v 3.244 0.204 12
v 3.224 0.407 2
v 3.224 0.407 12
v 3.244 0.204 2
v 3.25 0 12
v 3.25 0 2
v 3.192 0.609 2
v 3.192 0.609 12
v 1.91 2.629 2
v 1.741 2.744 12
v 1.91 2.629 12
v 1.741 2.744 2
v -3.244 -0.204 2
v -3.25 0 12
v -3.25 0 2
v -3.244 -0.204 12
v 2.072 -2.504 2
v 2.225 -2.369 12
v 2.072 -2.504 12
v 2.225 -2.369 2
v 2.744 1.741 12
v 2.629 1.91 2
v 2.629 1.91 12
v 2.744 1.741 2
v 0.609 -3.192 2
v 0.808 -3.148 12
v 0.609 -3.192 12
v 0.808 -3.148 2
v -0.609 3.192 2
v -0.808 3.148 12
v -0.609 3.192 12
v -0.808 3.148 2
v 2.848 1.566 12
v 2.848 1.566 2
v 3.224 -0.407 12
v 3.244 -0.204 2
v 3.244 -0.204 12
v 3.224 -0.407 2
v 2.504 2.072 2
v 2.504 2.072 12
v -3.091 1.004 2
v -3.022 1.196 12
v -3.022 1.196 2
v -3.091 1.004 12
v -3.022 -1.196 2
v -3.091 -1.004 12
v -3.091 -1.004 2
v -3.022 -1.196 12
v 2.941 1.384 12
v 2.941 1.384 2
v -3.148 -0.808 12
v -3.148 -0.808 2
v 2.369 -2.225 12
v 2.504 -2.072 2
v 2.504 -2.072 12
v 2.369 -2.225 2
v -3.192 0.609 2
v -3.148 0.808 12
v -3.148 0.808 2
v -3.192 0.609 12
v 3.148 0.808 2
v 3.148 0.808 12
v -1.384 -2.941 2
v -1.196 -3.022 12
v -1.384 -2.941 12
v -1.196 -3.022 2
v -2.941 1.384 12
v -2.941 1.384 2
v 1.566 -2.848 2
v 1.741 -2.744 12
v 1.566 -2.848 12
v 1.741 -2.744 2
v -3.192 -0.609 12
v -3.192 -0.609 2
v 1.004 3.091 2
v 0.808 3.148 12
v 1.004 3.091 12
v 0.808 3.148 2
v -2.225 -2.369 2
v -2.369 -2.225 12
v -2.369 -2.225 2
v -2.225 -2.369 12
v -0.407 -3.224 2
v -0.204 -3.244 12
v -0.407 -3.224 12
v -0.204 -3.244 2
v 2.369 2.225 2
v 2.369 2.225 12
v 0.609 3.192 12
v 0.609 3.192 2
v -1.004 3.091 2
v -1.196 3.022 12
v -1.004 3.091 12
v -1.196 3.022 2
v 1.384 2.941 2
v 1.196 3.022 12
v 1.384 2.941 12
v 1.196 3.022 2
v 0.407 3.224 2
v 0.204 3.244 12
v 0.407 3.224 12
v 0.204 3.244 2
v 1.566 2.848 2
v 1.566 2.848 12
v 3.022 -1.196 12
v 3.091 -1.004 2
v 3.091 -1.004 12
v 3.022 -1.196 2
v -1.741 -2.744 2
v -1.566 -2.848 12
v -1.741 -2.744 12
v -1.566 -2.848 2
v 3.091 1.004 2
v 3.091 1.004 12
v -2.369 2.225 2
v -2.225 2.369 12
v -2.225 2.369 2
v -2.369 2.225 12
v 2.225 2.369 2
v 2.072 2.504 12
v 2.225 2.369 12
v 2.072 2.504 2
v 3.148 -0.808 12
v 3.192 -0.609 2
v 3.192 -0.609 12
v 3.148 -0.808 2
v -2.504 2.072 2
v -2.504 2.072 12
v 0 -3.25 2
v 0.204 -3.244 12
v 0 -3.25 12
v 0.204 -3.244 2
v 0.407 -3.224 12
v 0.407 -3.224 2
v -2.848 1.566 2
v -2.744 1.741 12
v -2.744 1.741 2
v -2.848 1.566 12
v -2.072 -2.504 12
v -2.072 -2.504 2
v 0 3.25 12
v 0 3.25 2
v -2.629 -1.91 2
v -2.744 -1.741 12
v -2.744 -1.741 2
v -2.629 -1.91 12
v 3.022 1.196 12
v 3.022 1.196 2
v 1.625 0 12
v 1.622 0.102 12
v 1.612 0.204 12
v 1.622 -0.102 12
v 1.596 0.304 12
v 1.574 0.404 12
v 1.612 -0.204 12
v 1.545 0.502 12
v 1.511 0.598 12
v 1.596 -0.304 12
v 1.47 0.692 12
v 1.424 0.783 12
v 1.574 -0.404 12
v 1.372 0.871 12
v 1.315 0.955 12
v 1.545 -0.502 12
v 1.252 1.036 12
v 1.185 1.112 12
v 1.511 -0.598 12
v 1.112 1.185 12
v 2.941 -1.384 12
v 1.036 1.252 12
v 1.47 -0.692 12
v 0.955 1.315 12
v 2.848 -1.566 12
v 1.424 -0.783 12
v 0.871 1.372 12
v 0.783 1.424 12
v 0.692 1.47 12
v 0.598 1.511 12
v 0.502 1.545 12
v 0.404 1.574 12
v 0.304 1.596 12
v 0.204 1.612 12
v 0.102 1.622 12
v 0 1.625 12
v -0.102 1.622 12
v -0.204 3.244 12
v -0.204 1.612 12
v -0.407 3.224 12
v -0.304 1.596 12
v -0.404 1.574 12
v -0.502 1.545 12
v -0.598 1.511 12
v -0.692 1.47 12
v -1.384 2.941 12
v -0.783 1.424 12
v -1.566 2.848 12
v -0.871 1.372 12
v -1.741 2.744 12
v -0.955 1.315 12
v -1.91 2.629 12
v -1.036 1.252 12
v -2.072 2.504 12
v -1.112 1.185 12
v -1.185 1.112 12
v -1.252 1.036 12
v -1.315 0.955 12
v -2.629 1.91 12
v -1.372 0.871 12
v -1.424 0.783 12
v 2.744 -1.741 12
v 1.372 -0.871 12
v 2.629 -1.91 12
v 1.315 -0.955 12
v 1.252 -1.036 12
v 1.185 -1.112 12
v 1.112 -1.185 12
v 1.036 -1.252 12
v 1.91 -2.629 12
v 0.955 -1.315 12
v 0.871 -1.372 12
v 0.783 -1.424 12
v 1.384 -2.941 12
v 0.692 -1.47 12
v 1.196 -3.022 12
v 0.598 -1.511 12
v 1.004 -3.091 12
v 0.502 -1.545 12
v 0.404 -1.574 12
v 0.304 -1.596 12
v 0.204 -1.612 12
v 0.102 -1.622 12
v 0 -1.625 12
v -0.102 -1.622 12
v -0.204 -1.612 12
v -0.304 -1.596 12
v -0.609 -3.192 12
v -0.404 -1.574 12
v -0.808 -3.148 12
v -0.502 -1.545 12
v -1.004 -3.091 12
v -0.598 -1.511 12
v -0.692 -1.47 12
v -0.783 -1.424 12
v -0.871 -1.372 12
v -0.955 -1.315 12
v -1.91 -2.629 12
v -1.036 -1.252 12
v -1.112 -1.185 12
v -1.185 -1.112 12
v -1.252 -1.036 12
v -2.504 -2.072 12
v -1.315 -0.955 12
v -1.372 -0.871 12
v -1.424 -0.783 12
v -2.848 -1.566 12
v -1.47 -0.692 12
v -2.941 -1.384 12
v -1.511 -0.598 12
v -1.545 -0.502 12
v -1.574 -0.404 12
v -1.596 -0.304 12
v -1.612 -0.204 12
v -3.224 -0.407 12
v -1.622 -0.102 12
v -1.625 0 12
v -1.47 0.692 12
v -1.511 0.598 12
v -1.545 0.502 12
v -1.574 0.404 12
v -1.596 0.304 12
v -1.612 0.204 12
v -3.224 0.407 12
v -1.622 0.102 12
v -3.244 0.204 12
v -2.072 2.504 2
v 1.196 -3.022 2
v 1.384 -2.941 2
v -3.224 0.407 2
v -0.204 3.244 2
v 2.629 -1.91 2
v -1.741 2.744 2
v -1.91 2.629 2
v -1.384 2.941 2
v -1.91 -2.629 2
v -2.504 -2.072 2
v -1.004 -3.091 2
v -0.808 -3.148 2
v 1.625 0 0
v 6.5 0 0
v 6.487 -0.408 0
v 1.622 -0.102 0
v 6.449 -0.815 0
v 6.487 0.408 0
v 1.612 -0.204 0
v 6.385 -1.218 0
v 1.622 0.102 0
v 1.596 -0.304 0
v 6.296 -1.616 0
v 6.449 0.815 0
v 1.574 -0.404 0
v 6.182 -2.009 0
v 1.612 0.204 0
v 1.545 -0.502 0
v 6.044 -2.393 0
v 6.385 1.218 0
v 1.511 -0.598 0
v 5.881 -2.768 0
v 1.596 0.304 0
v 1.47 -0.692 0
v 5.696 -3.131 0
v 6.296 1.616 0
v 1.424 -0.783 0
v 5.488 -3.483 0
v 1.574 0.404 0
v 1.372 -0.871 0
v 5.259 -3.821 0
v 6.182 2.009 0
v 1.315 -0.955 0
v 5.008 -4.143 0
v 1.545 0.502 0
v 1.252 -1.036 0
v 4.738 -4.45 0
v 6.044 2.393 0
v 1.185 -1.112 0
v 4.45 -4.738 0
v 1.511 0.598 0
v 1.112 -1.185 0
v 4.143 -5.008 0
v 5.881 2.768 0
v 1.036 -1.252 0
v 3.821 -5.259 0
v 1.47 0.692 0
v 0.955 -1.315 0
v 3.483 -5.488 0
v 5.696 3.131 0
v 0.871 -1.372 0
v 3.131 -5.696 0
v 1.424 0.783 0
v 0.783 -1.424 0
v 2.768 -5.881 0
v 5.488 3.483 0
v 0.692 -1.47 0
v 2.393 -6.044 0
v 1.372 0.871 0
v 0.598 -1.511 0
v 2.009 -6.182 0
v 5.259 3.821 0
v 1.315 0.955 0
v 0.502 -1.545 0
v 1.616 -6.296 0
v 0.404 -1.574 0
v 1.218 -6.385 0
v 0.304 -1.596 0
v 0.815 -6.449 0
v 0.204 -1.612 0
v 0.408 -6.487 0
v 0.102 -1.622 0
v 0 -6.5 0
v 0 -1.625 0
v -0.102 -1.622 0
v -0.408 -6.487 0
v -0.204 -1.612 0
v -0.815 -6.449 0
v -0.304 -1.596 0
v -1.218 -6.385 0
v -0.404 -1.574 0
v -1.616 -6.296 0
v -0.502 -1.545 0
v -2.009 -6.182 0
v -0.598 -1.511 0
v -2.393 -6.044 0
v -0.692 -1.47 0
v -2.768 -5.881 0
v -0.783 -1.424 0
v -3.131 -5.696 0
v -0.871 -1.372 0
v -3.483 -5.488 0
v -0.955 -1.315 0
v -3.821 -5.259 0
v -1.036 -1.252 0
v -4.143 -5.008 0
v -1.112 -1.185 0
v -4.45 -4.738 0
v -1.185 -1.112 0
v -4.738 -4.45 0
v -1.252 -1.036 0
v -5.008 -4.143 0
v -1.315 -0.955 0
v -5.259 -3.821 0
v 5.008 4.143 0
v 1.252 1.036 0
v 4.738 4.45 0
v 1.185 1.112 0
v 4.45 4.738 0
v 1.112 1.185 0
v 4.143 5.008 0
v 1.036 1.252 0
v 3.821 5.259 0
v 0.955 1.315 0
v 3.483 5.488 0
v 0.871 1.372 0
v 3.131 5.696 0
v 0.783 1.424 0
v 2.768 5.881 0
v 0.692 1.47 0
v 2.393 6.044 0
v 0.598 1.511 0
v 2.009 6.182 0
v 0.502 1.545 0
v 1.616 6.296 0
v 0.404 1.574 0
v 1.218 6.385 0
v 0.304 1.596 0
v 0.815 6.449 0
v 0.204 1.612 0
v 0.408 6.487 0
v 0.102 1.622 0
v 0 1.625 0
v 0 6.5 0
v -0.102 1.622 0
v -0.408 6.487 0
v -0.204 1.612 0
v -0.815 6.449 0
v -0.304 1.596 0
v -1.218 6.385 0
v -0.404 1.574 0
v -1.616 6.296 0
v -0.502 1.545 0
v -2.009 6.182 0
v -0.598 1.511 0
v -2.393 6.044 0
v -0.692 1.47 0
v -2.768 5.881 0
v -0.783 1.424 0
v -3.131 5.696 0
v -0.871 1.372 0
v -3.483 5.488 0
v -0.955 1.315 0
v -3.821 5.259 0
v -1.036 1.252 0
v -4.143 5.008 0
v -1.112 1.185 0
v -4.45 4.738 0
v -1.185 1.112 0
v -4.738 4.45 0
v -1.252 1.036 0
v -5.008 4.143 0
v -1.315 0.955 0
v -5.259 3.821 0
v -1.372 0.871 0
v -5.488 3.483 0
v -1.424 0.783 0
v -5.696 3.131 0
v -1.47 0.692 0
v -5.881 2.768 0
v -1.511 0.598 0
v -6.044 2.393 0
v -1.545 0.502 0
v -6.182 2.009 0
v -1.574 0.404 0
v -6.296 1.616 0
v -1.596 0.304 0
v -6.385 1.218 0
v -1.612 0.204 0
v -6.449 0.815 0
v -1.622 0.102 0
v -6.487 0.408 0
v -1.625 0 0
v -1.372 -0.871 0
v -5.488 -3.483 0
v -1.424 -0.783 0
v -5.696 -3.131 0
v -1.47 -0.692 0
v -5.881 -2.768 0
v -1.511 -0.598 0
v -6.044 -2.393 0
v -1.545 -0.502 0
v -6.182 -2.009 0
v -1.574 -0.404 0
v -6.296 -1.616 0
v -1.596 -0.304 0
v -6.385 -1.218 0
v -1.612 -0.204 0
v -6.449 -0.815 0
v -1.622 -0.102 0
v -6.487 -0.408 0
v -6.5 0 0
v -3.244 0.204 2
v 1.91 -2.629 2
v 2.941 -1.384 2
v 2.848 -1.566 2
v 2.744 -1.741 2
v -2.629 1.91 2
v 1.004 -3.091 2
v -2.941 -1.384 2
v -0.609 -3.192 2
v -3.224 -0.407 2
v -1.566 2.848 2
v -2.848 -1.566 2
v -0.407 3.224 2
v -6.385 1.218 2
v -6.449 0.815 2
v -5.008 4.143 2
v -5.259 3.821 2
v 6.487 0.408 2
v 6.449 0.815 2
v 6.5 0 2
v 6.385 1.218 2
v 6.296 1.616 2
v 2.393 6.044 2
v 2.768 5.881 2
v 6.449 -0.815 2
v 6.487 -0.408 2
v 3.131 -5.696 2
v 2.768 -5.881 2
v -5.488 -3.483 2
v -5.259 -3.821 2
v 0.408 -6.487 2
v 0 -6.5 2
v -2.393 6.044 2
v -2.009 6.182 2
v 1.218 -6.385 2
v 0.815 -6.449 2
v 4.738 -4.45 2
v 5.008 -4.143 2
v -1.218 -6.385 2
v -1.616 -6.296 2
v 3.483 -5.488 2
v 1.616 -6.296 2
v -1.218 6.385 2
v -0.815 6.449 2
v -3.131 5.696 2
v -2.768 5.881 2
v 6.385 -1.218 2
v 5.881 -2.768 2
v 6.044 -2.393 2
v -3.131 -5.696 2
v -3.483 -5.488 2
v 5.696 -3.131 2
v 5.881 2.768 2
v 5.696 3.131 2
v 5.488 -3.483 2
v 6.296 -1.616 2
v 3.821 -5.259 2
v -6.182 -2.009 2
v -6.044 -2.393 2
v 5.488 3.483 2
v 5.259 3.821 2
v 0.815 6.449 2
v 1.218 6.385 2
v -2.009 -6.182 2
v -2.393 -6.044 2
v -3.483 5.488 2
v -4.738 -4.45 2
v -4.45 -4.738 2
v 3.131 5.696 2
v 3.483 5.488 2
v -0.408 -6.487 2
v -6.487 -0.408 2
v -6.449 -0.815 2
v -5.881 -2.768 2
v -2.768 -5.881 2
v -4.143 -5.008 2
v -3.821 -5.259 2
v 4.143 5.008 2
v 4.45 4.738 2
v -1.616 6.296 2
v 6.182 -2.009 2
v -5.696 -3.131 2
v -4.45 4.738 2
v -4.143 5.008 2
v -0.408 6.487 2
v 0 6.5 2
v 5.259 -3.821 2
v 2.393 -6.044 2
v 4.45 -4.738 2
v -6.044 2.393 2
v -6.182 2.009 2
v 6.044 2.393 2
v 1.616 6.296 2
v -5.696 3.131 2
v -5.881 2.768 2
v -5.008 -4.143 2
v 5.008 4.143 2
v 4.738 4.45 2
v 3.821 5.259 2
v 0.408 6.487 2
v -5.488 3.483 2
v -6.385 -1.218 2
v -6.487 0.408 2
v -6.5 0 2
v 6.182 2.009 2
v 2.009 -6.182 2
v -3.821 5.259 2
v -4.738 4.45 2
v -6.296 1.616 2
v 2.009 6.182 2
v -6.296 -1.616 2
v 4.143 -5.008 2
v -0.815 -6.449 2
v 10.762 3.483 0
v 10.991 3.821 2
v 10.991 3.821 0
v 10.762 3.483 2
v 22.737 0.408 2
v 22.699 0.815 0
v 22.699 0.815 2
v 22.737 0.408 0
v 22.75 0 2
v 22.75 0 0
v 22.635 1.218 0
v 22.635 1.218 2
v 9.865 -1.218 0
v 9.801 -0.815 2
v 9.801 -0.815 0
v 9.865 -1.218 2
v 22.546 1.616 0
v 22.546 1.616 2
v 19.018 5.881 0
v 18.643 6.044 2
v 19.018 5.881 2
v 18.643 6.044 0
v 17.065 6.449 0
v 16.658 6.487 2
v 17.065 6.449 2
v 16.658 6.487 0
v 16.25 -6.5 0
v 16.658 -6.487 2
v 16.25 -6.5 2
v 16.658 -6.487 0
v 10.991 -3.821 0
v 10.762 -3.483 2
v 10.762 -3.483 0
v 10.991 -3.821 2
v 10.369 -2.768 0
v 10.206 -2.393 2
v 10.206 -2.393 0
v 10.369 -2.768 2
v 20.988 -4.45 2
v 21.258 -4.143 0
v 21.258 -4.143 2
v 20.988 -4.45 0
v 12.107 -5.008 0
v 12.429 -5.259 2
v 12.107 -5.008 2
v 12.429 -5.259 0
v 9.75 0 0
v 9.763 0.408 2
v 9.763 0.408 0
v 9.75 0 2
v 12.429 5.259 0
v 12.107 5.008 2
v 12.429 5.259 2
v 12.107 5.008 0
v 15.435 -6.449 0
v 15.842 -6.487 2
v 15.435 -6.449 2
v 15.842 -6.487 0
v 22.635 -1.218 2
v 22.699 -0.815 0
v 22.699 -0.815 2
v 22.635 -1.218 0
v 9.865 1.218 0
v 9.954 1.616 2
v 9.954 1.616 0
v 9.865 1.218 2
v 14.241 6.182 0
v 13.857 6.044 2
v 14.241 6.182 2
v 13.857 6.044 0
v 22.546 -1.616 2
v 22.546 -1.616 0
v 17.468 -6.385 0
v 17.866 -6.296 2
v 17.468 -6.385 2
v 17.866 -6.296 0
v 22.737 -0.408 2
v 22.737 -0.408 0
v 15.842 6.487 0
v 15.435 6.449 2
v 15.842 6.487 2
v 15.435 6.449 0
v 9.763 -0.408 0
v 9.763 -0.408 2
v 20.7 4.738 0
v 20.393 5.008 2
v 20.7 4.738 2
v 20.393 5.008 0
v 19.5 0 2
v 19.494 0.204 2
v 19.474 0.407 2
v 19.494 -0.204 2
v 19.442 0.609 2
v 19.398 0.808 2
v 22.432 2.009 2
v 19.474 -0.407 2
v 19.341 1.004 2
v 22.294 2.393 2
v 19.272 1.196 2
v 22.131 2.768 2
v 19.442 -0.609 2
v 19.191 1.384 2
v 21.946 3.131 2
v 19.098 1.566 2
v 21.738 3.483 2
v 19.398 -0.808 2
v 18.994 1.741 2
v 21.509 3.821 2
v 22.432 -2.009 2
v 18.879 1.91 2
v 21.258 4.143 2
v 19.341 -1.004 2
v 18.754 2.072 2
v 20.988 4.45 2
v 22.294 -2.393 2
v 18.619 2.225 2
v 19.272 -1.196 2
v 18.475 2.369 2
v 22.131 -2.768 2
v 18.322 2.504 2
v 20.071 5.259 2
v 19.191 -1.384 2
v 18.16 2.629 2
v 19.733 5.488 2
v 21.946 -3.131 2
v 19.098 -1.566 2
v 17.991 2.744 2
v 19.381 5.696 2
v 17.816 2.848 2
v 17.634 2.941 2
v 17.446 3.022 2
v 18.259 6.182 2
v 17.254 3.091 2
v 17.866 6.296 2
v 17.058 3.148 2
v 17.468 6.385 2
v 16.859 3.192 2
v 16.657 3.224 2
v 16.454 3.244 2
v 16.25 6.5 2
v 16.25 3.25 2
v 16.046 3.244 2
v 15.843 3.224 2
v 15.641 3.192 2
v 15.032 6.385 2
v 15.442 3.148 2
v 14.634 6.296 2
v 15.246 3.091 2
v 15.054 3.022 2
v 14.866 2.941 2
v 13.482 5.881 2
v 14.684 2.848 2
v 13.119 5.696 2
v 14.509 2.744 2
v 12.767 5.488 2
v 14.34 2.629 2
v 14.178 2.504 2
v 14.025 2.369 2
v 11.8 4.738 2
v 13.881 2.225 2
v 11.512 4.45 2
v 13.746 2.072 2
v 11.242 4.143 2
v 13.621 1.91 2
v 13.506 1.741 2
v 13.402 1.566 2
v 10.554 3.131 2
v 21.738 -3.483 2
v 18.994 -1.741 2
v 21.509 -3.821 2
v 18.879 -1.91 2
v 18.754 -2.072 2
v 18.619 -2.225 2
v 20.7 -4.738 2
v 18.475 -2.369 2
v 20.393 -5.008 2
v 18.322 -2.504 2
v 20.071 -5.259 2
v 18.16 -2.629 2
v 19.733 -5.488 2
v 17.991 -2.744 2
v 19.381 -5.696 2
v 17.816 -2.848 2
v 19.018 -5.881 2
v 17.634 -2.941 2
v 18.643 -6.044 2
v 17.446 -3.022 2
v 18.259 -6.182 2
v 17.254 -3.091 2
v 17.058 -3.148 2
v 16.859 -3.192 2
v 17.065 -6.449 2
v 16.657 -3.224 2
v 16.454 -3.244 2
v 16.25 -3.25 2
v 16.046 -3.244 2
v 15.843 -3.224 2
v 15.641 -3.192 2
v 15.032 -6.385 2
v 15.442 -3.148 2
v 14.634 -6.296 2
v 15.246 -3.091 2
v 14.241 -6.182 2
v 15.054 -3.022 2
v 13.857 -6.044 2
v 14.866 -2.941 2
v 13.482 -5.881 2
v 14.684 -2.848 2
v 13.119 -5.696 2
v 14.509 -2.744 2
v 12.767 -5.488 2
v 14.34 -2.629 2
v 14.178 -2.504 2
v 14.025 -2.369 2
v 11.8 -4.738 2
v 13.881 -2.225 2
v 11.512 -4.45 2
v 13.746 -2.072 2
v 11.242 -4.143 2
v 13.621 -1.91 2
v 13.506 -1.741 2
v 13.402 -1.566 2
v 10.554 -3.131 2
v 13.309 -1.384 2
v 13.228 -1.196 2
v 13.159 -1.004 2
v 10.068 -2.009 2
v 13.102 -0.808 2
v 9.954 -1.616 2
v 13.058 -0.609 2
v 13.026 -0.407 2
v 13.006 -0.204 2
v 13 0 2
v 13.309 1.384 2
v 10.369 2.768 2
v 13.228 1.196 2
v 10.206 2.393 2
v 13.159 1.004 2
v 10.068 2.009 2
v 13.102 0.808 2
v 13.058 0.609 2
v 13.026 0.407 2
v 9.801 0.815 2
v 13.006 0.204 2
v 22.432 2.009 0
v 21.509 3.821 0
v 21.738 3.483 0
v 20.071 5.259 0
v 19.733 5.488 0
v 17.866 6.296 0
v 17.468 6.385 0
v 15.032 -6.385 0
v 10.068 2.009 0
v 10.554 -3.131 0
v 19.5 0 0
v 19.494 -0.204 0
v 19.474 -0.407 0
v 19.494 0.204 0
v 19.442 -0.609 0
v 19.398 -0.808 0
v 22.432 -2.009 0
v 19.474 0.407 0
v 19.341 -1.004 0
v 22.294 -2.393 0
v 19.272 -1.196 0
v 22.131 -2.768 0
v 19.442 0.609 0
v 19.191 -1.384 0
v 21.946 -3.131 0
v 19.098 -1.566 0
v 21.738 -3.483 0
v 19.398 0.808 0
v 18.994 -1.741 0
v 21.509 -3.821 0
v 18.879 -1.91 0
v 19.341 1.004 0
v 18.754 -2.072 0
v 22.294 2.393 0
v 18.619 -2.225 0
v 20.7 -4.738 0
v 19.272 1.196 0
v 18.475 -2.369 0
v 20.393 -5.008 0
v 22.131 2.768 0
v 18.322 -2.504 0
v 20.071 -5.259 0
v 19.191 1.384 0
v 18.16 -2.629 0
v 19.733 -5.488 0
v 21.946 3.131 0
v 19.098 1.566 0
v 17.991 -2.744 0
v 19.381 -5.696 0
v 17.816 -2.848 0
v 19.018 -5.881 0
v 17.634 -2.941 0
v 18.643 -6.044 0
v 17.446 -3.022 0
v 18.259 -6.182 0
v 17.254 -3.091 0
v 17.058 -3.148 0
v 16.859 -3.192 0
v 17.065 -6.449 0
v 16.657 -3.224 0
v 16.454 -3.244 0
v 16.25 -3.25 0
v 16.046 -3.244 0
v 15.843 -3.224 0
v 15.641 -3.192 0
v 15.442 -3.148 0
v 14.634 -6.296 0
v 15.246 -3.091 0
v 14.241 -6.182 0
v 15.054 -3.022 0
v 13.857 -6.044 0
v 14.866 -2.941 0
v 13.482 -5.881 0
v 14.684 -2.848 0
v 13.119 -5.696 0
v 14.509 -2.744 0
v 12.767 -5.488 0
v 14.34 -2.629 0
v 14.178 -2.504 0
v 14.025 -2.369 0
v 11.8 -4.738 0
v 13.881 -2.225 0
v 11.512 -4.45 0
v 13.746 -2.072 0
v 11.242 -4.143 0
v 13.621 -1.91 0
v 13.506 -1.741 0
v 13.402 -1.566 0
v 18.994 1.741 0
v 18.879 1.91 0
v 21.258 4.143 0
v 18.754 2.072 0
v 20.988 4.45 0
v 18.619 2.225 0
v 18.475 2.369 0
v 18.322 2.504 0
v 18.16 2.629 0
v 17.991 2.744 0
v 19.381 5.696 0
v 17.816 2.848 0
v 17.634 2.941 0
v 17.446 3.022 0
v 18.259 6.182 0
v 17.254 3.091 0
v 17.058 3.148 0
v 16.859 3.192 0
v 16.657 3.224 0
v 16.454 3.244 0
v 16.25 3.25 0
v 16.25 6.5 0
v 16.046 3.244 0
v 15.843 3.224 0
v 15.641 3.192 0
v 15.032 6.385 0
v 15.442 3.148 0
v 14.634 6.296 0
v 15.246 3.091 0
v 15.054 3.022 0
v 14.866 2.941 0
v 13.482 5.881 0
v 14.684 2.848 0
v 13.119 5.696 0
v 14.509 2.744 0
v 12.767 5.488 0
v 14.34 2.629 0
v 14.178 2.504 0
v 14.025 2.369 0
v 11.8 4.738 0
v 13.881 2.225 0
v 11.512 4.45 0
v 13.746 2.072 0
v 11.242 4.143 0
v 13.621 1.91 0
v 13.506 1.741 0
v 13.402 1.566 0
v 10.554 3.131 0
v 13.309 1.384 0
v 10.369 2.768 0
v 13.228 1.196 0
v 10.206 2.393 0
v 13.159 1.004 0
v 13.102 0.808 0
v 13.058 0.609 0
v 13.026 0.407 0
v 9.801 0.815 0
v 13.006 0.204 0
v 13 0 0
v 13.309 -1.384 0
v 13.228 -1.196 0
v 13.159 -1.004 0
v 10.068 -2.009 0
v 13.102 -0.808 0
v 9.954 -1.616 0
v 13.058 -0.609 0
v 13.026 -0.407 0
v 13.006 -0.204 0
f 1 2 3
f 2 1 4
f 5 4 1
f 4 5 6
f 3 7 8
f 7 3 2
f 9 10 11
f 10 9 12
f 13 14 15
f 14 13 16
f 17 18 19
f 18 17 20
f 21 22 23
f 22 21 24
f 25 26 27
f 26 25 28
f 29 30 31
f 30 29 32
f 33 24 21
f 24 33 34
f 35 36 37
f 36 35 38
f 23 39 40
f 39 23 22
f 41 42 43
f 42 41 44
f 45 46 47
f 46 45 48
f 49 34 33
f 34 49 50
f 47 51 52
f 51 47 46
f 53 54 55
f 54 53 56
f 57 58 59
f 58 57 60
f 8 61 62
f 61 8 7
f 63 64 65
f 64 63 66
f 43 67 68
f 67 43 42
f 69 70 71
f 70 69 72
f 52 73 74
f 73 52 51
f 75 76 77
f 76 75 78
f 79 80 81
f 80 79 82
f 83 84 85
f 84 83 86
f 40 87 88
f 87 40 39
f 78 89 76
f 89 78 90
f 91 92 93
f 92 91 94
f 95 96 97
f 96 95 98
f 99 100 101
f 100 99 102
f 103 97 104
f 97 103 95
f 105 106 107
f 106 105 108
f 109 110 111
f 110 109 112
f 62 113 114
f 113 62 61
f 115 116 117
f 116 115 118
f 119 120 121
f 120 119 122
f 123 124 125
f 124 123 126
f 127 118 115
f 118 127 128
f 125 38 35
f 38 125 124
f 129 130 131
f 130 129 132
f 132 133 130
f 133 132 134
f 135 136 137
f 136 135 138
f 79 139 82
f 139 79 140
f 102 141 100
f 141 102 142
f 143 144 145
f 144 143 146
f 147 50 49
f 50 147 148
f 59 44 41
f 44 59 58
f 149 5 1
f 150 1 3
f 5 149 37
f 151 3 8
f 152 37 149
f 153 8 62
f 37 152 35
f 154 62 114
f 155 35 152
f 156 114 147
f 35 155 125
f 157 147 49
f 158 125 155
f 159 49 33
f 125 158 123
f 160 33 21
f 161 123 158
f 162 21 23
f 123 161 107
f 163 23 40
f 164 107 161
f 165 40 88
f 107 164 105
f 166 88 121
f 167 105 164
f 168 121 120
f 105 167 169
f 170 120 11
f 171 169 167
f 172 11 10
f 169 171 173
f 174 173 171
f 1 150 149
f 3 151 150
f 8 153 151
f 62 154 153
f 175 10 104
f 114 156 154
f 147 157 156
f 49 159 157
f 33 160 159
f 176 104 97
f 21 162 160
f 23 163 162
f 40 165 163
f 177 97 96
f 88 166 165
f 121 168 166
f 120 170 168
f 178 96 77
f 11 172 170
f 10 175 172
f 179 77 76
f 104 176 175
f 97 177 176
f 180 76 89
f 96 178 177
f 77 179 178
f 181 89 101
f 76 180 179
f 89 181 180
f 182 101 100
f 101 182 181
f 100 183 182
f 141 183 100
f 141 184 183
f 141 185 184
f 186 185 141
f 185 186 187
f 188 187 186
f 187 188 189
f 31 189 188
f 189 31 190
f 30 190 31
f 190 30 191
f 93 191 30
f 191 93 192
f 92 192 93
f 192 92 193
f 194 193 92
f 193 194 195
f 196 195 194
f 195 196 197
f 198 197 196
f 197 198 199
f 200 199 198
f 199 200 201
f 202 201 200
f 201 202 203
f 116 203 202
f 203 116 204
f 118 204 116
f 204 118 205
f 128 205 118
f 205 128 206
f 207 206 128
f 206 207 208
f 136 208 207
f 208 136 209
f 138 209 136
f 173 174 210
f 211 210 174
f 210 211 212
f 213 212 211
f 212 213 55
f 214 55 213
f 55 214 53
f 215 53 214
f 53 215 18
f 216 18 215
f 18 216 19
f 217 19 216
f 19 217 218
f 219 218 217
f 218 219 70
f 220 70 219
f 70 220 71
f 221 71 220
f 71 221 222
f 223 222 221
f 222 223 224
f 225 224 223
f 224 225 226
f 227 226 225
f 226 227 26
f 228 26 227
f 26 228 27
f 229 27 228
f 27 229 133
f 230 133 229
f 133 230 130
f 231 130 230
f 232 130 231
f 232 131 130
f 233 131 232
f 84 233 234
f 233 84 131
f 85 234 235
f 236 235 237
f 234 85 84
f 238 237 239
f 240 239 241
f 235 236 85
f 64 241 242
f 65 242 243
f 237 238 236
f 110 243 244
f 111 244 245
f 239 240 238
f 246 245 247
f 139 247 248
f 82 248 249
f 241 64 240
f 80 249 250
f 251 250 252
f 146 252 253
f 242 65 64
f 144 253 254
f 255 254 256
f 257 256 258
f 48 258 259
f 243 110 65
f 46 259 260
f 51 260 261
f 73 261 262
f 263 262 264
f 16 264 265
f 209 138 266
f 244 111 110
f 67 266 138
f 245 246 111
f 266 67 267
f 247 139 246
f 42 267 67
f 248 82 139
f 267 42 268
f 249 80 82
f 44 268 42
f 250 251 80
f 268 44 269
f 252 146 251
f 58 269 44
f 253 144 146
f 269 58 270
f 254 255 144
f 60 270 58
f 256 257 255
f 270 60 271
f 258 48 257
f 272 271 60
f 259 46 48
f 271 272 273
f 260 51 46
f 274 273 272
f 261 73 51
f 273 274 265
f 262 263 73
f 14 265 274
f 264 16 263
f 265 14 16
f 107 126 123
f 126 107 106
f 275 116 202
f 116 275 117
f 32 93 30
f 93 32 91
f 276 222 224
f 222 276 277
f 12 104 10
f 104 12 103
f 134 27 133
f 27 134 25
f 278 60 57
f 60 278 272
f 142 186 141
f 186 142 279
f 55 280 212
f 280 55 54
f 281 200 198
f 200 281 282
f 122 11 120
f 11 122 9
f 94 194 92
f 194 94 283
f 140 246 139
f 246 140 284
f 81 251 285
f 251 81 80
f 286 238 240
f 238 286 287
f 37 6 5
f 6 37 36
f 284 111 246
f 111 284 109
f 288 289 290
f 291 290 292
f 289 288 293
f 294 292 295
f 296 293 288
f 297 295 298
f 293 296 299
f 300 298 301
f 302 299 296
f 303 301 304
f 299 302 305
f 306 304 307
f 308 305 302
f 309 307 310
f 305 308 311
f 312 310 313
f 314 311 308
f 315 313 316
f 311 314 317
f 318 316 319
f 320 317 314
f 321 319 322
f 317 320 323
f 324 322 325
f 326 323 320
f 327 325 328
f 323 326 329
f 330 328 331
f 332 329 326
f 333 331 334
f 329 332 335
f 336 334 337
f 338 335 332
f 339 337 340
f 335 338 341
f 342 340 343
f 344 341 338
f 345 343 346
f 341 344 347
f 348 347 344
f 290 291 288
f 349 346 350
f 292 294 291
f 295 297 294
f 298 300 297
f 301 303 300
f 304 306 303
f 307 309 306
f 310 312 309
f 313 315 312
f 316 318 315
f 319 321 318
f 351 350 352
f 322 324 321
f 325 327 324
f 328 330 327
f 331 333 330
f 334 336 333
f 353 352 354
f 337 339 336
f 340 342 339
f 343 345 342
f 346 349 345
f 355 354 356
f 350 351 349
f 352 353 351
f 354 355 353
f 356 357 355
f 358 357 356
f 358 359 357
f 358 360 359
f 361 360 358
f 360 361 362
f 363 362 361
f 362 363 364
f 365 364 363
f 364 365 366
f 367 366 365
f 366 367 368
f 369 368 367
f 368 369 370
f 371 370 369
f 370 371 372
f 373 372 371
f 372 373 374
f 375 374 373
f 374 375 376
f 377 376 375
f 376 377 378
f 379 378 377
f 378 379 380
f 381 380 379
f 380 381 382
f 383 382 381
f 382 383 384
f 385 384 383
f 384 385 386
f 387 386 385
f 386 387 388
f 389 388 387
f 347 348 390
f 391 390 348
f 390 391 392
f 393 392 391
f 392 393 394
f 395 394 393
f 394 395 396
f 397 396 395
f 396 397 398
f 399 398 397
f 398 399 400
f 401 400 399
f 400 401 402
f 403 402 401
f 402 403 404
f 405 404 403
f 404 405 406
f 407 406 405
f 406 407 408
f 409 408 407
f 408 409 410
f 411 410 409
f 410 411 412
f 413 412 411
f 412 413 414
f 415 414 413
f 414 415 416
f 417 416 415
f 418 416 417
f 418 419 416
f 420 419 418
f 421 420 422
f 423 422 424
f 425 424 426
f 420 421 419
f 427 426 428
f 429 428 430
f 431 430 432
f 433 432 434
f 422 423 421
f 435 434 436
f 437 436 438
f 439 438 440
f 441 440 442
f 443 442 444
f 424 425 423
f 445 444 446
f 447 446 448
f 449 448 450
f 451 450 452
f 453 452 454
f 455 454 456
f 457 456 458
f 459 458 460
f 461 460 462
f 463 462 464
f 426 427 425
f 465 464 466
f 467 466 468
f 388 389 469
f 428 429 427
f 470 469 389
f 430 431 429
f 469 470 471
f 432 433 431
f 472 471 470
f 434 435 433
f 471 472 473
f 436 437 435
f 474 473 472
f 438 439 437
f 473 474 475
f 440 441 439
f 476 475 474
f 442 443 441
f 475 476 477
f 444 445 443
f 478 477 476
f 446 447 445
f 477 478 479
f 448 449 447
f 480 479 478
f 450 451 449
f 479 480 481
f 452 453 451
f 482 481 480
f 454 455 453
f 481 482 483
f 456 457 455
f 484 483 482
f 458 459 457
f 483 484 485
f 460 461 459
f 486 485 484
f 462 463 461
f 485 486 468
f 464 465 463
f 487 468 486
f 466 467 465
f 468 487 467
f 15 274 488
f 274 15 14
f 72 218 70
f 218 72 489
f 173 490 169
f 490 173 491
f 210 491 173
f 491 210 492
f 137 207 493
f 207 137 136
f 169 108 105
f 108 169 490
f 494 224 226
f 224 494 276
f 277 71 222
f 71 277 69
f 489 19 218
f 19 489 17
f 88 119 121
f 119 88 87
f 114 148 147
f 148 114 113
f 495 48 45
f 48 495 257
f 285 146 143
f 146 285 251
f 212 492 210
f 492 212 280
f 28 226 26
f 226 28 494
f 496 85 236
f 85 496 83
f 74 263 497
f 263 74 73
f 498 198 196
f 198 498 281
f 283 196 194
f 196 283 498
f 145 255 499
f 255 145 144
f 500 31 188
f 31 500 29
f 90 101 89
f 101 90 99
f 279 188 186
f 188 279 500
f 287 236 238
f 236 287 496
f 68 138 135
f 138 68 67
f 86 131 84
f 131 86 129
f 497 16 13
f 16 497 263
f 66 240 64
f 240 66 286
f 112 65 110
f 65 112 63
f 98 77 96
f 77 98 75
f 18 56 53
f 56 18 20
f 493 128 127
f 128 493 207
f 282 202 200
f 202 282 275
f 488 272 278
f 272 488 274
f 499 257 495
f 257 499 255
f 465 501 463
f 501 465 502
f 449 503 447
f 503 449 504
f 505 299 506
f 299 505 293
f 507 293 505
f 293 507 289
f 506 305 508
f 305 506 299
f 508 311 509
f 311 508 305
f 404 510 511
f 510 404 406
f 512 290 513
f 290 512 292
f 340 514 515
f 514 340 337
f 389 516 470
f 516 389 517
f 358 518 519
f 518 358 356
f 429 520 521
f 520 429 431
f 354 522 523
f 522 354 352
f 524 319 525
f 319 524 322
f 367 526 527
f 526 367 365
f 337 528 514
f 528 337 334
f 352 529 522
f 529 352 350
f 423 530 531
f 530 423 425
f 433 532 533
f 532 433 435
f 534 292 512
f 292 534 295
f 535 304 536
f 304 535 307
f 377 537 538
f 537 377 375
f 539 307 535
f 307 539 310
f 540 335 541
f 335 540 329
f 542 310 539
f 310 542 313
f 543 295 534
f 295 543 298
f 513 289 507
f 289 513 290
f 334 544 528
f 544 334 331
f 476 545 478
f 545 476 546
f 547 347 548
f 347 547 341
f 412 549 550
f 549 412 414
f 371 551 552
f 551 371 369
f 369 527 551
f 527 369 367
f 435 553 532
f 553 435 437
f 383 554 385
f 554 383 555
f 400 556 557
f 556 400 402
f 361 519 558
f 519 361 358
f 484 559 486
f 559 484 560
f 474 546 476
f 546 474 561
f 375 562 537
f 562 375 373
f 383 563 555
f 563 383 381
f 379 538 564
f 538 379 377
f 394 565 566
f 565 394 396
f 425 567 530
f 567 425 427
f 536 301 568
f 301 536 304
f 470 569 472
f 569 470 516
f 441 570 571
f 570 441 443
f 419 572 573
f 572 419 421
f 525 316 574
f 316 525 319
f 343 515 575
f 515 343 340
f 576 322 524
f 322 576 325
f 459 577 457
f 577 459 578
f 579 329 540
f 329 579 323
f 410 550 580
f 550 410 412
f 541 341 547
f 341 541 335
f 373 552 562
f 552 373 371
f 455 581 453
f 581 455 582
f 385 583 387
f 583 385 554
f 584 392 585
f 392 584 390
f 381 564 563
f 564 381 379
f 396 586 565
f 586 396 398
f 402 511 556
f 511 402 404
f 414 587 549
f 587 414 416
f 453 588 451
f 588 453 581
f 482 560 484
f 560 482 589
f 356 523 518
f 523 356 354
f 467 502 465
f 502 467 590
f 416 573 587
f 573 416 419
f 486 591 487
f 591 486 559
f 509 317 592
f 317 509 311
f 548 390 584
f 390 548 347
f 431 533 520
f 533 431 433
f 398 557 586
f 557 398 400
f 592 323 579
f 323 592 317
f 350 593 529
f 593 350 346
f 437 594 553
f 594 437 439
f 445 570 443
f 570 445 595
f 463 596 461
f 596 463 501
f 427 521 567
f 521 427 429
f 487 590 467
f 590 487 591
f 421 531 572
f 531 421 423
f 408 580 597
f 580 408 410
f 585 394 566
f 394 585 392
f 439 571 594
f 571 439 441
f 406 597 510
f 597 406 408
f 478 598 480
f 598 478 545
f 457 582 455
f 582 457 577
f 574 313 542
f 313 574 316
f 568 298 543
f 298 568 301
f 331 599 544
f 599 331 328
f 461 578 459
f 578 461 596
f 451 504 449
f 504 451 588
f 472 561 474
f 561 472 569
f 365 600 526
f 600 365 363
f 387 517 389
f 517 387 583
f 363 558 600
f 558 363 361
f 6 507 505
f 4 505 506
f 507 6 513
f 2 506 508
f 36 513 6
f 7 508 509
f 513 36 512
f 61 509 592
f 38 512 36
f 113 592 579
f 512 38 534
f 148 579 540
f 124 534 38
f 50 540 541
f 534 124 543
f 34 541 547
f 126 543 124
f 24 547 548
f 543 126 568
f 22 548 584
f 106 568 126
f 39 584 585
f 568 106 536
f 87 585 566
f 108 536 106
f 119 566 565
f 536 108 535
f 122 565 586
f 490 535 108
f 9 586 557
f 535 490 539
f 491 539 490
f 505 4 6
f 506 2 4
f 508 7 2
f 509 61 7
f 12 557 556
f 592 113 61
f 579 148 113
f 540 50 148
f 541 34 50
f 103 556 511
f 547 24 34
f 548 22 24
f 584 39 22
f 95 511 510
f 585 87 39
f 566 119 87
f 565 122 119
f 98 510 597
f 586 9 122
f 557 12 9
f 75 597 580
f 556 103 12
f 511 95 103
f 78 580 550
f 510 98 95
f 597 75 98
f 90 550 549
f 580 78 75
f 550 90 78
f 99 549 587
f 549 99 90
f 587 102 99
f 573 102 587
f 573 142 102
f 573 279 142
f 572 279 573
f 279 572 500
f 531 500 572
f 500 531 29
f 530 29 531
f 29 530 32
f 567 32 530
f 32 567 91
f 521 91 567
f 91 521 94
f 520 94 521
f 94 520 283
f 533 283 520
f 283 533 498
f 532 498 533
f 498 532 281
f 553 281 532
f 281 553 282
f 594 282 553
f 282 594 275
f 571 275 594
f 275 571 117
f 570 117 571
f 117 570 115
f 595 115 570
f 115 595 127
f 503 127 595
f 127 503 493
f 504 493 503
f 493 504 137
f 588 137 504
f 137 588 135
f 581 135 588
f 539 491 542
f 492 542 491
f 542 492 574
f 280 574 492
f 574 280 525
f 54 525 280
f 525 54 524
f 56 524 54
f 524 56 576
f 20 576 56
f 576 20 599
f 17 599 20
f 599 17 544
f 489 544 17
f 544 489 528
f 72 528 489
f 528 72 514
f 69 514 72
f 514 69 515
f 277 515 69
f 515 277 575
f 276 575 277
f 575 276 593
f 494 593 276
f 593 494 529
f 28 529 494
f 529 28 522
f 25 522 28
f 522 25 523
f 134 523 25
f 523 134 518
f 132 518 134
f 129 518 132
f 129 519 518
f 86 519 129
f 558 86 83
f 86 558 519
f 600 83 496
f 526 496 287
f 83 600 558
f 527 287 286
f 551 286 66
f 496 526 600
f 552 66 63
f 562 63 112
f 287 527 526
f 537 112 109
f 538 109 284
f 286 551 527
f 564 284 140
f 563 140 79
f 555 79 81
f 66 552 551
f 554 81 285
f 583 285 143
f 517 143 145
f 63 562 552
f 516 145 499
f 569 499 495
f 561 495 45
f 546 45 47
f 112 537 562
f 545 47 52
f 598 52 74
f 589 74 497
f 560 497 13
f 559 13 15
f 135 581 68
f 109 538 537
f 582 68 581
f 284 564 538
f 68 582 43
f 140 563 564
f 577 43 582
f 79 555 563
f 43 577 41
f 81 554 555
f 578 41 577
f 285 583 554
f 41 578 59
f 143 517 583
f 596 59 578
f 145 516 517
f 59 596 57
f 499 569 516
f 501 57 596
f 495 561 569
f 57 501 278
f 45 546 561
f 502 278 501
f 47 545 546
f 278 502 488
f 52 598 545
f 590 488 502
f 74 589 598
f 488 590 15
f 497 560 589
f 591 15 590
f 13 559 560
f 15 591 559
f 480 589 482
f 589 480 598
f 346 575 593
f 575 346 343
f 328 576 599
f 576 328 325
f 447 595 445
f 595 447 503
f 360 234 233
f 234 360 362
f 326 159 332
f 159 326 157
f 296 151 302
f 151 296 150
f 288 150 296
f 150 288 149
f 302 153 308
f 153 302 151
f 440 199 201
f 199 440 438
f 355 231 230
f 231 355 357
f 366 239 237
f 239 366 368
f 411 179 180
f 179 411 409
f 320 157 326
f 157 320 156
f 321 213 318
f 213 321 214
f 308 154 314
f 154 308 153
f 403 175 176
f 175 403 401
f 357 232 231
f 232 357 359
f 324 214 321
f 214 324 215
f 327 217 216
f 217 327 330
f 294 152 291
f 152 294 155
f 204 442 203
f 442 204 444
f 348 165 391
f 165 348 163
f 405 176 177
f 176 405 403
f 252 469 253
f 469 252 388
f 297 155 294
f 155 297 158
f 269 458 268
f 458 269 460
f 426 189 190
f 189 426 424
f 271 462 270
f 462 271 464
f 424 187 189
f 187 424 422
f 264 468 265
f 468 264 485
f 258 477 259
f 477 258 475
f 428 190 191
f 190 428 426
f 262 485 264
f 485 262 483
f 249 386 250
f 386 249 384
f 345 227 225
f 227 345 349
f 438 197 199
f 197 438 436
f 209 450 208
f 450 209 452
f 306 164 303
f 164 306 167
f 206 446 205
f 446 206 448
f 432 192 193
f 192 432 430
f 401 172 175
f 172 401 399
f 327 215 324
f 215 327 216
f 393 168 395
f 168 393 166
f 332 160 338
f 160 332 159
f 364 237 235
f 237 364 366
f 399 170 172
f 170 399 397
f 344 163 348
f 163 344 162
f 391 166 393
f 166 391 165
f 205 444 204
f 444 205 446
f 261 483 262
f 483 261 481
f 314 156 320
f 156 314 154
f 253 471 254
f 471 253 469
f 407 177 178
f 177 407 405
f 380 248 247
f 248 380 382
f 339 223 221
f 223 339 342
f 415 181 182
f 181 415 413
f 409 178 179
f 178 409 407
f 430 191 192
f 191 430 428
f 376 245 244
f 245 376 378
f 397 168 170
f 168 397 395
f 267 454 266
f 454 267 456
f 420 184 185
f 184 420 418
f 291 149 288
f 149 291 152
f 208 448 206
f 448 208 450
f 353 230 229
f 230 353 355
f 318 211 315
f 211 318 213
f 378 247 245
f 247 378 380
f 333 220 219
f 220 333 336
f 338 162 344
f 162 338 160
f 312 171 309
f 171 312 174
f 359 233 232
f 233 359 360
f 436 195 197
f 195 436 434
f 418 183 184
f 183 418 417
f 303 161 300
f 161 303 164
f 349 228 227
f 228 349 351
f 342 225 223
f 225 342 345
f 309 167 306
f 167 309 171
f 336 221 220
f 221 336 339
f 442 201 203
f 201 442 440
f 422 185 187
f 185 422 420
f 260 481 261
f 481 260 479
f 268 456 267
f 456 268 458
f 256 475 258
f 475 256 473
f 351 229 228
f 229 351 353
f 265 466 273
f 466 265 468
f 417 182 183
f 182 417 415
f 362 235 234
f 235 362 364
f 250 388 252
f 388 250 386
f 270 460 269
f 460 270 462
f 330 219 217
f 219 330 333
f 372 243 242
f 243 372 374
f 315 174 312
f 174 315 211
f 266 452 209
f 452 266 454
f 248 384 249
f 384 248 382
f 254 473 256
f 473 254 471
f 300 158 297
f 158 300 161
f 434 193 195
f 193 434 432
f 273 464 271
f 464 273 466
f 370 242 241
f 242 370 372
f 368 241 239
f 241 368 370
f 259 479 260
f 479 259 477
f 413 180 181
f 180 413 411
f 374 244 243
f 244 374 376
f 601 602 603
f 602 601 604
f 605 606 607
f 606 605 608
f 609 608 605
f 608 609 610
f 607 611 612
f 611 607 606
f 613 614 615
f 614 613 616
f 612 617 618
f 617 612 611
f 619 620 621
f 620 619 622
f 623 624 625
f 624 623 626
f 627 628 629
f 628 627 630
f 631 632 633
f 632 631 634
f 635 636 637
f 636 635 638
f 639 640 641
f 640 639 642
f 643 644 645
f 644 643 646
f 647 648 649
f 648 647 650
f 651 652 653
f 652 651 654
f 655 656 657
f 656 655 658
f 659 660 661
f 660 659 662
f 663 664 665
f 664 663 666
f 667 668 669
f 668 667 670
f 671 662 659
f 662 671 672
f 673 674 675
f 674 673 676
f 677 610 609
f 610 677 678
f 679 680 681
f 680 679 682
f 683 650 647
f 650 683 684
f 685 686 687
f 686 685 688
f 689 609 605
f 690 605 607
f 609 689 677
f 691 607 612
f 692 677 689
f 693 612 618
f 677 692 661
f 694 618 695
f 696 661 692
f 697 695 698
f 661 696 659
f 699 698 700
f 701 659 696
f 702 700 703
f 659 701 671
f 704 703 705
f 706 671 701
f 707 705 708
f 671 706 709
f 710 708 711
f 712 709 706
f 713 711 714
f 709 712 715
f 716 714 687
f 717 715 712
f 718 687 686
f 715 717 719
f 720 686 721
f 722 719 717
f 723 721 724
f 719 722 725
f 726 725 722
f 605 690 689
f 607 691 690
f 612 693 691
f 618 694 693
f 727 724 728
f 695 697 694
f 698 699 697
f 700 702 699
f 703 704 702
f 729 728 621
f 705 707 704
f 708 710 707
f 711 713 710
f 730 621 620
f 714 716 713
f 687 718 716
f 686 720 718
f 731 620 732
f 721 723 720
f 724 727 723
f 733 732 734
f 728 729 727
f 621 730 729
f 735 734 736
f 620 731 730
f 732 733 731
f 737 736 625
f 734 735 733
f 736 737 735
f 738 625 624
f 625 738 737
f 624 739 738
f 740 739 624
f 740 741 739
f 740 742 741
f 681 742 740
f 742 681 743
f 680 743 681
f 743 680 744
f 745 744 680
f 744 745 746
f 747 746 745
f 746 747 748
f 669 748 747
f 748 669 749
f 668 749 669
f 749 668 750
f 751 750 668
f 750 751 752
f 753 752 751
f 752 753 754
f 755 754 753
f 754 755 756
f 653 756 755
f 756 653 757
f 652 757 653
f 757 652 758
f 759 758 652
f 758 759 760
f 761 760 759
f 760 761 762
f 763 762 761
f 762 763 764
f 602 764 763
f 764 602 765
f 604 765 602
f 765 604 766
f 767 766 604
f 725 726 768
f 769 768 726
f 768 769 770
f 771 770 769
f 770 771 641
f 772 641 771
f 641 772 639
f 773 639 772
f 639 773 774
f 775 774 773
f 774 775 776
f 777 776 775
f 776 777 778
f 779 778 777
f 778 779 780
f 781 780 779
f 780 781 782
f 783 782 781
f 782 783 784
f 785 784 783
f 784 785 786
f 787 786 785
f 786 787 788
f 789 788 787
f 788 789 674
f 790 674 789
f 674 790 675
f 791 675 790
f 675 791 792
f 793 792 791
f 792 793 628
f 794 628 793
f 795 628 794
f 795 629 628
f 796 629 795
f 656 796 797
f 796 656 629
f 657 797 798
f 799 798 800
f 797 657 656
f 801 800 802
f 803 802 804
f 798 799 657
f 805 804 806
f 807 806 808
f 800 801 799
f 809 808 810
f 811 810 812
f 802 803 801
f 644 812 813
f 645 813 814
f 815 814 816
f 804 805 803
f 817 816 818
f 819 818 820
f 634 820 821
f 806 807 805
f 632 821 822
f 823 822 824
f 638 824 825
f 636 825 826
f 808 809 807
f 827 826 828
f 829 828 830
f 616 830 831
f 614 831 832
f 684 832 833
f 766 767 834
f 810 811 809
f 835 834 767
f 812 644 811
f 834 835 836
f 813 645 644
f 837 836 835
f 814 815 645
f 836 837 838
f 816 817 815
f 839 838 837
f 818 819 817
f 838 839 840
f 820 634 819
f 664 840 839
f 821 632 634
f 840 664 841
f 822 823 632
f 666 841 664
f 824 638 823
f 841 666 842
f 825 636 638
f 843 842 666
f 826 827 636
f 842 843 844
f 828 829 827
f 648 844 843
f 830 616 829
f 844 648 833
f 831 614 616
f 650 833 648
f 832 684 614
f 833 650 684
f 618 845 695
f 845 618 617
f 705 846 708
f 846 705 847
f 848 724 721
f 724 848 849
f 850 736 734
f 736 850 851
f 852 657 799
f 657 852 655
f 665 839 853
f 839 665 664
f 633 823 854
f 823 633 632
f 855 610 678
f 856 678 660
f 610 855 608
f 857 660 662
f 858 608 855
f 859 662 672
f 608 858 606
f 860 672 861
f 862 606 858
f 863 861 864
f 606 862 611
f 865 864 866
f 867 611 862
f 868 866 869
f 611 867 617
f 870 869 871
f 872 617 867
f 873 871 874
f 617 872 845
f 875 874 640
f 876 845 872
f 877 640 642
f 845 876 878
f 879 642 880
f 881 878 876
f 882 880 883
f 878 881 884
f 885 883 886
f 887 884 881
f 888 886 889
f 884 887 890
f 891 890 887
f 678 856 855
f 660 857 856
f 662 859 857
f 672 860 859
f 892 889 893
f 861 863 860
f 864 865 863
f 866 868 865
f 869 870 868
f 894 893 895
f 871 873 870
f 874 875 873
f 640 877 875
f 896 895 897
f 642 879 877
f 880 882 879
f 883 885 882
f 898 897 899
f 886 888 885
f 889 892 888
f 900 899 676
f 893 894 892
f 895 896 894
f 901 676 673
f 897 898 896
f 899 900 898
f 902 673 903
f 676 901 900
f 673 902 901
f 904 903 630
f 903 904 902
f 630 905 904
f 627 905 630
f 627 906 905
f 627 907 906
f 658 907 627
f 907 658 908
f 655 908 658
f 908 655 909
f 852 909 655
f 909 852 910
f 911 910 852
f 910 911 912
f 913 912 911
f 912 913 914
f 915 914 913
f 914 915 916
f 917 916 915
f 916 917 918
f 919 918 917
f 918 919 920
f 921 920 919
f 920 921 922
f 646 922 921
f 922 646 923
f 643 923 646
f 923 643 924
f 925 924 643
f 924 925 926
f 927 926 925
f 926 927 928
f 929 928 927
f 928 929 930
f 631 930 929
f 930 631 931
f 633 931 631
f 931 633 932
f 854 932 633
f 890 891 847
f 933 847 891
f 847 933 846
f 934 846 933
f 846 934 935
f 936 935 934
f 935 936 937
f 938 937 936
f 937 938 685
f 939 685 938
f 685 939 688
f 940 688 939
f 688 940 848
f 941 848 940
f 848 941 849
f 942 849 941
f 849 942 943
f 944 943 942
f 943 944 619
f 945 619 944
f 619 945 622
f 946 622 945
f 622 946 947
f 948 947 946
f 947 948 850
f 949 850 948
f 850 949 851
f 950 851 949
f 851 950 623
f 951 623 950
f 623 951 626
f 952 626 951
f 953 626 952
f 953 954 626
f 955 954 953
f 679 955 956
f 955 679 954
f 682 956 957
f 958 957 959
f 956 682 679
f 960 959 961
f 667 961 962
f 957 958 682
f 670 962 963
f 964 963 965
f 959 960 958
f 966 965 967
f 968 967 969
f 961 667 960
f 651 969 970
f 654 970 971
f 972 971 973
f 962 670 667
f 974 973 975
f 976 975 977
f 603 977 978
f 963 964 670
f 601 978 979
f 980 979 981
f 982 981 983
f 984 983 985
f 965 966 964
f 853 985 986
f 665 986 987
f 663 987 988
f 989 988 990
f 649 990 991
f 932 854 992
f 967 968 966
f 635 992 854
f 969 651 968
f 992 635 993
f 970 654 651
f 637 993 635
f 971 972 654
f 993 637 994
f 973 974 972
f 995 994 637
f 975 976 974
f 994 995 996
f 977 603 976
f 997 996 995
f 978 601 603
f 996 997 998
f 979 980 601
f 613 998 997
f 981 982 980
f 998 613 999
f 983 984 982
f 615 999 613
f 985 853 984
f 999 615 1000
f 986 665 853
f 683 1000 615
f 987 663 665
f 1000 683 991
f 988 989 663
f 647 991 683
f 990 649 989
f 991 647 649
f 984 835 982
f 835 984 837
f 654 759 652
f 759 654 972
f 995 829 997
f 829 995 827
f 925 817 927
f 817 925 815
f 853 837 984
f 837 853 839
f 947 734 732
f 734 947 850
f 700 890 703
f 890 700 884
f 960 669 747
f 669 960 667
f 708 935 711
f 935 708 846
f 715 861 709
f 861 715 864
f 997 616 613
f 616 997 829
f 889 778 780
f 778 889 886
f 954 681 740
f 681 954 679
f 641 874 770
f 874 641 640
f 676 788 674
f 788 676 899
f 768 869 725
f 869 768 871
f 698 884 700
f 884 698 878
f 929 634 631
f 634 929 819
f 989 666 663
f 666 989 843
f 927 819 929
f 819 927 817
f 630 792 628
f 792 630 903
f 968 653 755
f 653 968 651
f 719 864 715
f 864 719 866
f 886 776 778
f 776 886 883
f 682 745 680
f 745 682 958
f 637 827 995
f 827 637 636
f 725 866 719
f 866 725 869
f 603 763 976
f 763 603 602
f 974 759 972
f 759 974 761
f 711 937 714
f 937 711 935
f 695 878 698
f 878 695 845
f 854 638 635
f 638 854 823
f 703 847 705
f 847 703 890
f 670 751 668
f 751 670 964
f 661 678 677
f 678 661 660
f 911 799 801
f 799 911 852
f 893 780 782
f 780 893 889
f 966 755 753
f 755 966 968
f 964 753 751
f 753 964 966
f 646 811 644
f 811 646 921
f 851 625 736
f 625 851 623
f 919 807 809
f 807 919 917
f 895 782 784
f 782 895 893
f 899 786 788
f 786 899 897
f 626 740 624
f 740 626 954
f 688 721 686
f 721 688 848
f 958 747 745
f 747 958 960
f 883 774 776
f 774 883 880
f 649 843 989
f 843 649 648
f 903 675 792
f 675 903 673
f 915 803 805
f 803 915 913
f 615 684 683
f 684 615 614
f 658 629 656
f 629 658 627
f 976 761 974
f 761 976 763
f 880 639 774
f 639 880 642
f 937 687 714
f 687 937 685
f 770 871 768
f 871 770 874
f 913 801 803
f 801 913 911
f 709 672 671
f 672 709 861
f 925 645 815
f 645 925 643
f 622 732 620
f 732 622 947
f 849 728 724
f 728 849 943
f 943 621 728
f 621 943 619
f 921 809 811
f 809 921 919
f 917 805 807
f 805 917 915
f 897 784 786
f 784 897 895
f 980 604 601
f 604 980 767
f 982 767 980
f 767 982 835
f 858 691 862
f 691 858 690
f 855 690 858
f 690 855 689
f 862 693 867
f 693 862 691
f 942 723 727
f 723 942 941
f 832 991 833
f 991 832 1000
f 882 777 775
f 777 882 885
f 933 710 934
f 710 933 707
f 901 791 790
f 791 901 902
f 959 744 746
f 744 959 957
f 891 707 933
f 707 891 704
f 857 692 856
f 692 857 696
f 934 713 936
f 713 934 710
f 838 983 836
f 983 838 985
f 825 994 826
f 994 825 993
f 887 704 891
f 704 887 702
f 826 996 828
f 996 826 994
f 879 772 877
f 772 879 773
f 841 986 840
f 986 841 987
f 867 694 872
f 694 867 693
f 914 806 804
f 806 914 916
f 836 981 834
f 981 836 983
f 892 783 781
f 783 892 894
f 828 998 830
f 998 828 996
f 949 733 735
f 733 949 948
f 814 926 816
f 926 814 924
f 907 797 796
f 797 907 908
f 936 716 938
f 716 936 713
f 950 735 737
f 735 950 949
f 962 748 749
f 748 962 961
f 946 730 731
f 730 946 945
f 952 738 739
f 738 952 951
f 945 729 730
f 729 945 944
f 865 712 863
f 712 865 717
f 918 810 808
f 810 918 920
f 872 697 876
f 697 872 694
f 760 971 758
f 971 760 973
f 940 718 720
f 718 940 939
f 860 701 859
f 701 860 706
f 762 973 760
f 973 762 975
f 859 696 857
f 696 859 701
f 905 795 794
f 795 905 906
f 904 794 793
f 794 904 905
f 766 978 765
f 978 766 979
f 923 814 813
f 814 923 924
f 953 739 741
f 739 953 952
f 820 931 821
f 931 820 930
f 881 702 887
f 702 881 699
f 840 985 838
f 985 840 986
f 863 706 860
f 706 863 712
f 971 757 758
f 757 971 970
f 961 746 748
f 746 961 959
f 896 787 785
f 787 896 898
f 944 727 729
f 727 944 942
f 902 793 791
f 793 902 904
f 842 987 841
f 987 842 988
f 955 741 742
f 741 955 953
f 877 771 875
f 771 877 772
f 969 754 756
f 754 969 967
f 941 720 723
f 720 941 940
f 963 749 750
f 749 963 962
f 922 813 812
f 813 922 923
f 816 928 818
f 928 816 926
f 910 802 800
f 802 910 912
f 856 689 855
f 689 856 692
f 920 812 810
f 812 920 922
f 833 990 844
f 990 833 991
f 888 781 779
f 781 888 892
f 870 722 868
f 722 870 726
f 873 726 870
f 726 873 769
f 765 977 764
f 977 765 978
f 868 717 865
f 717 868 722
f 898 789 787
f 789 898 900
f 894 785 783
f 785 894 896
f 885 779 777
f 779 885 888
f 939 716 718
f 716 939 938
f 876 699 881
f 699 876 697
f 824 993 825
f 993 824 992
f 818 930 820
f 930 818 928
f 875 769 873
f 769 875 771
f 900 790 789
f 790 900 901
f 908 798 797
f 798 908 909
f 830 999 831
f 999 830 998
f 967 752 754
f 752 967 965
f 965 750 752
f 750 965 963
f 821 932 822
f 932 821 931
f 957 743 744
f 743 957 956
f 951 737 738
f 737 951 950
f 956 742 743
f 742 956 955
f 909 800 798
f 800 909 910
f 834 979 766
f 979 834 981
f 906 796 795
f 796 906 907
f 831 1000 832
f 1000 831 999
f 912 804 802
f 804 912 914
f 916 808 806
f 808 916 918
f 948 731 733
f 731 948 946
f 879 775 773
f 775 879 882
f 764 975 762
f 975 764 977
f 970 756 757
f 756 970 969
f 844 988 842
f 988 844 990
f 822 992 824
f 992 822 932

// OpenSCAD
// Main Coil Spool Body
module spool_body() {
    difference() {
        union() {
            // Center core
            cylinder(h=12.0, r=3.25, 
                    center=false, $fn=100);

            // Bottom flange only
            cylinder(h=2.0, r=6.5, 
                    center=false, $fn=100);
        }

        // Center hole for mounting
        cylinder(h=13.0, r=1.625, 
                center=false, $fn=100);
    }
}

// Simple Cap (matching core diameter)
module spool_cap() {
    difference() {
        cylinder(h=2.0, r=6.5, 
                center=false, $fn=100);

        // Center hole matching core
        cylinder(h=3.0, r=3.25, 
                center=false, $fn=100);
    }
}

// Define copper coil appearance for assembly
module copper_coil() {
    color("Orange", 0.8) {
        spool_body();
        translate([0, 0, 12.0])
        spool_cap();
    }
}

// For individual part export
if ($preview) {
    // Preview assembled
    copper_coil();
} else {
    // Export separate parts
    spool_body();
    translate([16.25, 0, 0])
    spool_cap();
}
